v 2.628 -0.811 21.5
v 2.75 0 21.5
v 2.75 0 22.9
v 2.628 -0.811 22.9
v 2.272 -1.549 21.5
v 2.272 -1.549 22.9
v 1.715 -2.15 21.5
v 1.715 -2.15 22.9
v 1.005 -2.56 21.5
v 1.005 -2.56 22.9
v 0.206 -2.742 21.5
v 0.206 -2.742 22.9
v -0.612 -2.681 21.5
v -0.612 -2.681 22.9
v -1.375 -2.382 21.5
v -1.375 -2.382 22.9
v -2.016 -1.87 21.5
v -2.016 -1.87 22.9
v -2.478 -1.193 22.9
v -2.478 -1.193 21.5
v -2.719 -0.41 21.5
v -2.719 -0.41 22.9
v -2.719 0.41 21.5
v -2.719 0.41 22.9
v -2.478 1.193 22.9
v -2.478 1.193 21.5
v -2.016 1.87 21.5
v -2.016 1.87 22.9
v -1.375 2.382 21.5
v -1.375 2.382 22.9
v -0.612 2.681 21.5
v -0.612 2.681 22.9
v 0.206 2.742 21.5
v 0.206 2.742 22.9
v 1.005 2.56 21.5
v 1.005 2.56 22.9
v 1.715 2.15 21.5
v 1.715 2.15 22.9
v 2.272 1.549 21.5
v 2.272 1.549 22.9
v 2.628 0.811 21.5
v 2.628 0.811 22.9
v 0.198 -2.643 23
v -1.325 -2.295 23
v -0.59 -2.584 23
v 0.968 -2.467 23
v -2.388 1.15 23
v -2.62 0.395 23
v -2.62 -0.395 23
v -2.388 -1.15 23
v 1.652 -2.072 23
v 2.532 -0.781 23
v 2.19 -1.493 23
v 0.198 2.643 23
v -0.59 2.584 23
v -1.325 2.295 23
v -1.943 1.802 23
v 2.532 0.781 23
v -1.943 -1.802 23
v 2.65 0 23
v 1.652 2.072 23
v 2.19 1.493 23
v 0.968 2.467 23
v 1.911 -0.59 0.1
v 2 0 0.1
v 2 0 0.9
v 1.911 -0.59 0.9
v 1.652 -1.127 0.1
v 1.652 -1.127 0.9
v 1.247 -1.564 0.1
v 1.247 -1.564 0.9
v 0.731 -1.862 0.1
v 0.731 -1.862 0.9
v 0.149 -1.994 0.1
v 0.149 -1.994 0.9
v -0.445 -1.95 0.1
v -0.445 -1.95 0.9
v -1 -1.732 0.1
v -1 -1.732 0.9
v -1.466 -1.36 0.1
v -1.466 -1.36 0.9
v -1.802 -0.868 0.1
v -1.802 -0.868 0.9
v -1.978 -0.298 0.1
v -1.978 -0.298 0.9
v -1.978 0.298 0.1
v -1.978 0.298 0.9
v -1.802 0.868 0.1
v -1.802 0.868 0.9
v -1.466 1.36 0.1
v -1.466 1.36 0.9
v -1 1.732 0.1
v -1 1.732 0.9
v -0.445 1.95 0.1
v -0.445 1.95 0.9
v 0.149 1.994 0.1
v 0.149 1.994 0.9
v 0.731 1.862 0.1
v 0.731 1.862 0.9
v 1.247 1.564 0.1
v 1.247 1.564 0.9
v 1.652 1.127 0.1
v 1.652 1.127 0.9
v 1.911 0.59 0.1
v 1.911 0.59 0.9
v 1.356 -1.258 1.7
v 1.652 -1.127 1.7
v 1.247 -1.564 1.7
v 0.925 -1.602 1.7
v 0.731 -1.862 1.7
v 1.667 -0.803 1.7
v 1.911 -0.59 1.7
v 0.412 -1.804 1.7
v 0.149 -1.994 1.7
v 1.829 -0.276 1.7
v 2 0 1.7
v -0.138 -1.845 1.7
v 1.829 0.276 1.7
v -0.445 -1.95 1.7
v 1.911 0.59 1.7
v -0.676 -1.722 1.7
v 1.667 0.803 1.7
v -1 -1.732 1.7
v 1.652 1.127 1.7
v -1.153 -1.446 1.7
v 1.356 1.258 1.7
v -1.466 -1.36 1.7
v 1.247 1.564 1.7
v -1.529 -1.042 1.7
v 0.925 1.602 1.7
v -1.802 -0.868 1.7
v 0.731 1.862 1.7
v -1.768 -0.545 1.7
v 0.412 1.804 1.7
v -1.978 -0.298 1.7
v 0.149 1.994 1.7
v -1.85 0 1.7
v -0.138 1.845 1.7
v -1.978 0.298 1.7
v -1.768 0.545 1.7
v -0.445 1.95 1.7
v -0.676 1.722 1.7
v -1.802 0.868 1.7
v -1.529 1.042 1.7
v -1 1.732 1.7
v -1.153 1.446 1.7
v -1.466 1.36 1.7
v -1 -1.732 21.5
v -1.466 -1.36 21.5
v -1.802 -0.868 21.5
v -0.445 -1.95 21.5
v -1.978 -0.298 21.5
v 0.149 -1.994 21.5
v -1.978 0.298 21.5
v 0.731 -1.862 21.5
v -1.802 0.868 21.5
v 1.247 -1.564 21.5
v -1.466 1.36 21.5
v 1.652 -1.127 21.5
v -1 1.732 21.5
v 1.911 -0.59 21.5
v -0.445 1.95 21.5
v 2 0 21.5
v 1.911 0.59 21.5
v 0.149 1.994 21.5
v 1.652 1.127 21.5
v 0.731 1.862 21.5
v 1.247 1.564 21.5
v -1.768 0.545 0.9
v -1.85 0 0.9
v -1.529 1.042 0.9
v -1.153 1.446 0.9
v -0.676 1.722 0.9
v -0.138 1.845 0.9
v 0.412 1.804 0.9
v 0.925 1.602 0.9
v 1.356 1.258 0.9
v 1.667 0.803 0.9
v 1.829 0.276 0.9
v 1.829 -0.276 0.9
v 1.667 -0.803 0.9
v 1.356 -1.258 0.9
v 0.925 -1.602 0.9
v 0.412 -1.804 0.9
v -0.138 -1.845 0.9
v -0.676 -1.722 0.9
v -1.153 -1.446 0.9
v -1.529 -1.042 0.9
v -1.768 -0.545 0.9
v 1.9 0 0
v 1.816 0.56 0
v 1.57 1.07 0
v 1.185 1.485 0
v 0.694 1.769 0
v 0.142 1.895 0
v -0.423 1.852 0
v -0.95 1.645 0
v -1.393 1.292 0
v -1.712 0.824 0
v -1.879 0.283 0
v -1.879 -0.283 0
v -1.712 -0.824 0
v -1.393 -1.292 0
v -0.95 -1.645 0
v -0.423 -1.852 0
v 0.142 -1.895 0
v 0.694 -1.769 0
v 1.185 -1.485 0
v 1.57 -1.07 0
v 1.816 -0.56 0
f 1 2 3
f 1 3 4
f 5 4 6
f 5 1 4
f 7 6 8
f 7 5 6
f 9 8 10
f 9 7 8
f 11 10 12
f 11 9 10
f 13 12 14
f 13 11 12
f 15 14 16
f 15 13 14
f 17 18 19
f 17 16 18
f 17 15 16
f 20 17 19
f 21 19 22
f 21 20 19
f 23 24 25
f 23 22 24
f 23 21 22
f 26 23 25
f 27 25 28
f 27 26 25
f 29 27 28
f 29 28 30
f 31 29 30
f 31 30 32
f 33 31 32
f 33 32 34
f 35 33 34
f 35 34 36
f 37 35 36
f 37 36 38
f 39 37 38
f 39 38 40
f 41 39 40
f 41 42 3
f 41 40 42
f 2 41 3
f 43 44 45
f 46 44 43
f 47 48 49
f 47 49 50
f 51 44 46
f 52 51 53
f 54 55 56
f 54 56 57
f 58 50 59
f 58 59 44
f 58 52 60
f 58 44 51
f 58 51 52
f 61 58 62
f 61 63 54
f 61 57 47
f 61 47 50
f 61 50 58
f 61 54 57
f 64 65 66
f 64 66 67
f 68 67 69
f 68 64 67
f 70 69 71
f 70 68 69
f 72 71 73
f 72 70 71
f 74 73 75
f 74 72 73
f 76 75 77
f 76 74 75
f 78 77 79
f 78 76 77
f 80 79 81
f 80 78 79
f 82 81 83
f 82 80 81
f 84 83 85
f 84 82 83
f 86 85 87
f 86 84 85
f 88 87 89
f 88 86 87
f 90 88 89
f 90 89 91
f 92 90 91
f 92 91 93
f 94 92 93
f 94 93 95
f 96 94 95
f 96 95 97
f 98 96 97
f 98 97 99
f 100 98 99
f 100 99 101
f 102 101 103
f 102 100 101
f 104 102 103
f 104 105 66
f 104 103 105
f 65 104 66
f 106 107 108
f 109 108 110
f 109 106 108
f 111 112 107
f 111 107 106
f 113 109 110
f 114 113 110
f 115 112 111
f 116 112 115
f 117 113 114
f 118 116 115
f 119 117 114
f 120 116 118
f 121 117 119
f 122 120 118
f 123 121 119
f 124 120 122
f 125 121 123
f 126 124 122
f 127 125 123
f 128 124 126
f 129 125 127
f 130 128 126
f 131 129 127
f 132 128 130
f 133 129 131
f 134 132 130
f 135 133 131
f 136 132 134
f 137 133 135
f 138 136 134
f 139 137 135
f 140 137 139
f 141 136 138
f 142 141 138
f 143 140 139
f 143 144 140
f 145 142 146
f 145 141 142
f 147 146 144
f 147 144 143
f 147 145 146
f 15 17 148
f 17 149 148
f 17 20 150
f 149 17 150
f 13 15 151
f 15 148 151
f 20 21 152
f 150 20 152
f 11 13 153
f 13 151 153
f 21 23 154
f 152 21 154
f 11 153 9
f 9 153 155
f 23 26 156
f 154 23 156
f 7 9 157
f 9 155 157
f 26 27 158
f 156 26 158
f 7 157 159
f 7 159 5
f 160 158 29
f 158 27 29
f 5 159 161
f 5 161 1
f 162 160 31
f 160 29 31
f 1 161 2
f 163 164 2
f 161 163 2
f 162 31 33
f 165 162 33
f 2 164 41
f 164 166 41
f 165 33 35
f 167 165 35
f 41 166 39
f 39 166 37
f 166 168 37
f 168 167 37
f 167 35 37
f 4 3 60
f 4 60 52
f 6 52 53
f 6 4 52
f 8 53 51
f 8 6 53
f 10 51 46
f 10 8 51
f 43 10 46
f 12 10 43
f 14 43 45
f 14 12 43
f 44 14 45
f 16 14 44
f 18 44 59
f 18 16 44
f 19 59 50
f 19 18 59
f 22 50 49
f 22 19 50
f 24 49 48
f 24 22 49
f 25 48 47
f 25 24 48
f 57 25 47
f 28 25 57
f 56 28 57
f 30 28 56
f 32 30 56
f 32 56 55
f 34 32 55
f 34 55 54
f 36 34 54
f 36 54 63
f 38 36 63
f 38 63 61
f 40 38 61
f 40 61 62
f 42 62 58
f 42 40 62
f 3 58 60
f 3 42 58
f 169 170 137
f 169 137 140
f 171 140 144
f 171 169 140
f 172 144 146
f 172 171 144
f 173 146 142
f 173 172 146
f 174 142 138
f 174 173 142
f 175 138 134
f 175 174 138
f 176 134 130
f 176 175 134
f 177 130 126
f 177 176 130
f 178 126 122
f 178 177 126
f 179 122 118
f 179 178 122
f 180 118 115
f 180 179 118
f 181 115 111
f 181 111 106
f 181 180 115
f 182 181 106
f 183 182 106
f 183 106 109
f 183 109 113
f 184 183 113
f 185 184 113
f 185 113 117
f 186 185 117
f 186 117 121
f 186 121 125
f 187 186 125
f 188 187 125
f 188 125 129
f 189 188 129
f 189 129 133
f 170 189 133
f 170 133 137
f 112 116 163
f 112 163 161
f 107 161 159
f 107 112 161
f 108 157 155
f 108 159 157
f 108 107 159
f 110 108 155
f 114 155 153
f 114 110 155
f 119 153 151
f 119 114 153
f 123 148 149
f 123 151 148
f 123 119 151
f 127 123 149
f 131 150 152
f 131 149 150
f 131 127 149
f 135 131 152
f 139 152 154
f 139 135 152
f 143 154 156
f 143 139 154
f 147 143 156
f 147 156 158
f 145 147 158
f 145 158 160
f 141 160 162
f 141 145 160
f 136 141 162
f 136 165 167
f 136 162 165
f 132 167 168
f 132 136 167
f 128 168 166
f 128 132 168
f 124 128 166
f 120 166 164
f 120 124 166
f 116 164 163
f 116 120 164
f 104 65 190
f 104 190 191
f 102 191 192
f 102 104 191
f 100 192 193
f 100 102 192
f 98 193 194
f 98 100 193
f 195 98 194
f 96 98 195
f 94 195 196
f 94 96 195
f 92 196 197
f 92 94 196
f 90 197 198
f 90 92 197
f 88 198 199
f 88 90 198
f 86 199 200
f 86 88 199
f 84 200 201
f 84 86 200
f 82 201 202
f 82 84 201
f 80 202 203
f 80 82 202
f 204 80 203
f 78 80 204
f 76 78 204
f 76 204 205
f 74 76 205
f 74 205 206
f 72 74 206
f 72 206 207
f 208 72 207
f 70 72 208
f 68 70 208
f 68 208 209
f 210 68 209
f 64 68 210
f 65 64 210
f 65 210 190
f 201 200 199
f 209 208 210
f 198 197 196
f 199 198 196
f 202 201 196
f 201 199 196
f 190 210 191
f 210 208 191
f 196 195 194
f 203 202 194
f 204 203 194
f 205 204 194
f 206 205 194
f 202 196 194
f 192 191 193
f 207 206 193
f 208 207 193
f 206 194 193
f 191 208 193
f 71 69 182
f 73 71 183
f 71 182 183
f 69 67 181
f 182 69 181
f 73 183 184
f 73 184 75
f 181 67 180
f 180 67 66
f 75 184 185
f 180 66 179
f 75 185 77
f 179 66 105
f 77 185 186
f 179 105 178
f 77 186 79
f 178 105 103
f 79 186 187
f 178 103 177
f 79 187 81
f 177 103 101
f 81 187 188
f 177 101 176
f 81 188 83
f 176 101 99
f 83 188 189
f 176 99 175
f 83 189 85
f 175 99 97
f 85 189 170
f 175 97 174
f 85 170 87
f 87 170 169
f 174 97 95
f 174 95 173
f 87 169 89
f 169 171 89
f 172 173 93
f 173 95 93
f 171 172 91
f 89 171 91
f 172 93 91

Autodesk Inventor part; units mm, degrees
ref_plane "YZ Plane" through (0, 0, 0) normal (1, 0, 0) x (0, 1, 0)
ref_plane "XZ Plane" through (0, 0, 0) normal (0, 1, 0) x (-1, 0, 0)
sketch "Sketch1" plane through (0, 0, 0) normal (0, 0, 1) x (1, 0, 0)
  circle A0 centre (0, 0) radius 2
  dimension "d0" = 4
extrude "Extrusion1" add sketch "Sketch1" along normal blind 21.5
sketch "Sketch2" plane through (0, 0, 21.5) normal (0, 0, 1) x (1, 0, 0)
  circle A0 centre (0, 0) radius 2.75
  dimension "d3" = 5.5
extrude "Extrusion2" add sketch "Sketch2" along normal blind 1.5
ref_plane "Work Plane1" through (0, 0, 1.3) normal (0, 0, -1) x (-1, 0, 0)
sketch "Sketch3" plane through (0, 0, 1.3) normal (0, 0, -1) x (-1, 0, 0)
  circle A0 centre (0, 0) radius 2 projected
  circle A1 centre (0, 0) radius 1.85
  dimension "d7" = 3.7
extrude "Extrusion3" cut sketch "Sketch3" along normal mid plane 0.8
chamfer "Chamfer1" distance 0.1 angle 45 2 edges at (-2, 0, 0) (-2.75, 0, 23)
properties part number "roller pin" material "Aluminum 3003-H14"
